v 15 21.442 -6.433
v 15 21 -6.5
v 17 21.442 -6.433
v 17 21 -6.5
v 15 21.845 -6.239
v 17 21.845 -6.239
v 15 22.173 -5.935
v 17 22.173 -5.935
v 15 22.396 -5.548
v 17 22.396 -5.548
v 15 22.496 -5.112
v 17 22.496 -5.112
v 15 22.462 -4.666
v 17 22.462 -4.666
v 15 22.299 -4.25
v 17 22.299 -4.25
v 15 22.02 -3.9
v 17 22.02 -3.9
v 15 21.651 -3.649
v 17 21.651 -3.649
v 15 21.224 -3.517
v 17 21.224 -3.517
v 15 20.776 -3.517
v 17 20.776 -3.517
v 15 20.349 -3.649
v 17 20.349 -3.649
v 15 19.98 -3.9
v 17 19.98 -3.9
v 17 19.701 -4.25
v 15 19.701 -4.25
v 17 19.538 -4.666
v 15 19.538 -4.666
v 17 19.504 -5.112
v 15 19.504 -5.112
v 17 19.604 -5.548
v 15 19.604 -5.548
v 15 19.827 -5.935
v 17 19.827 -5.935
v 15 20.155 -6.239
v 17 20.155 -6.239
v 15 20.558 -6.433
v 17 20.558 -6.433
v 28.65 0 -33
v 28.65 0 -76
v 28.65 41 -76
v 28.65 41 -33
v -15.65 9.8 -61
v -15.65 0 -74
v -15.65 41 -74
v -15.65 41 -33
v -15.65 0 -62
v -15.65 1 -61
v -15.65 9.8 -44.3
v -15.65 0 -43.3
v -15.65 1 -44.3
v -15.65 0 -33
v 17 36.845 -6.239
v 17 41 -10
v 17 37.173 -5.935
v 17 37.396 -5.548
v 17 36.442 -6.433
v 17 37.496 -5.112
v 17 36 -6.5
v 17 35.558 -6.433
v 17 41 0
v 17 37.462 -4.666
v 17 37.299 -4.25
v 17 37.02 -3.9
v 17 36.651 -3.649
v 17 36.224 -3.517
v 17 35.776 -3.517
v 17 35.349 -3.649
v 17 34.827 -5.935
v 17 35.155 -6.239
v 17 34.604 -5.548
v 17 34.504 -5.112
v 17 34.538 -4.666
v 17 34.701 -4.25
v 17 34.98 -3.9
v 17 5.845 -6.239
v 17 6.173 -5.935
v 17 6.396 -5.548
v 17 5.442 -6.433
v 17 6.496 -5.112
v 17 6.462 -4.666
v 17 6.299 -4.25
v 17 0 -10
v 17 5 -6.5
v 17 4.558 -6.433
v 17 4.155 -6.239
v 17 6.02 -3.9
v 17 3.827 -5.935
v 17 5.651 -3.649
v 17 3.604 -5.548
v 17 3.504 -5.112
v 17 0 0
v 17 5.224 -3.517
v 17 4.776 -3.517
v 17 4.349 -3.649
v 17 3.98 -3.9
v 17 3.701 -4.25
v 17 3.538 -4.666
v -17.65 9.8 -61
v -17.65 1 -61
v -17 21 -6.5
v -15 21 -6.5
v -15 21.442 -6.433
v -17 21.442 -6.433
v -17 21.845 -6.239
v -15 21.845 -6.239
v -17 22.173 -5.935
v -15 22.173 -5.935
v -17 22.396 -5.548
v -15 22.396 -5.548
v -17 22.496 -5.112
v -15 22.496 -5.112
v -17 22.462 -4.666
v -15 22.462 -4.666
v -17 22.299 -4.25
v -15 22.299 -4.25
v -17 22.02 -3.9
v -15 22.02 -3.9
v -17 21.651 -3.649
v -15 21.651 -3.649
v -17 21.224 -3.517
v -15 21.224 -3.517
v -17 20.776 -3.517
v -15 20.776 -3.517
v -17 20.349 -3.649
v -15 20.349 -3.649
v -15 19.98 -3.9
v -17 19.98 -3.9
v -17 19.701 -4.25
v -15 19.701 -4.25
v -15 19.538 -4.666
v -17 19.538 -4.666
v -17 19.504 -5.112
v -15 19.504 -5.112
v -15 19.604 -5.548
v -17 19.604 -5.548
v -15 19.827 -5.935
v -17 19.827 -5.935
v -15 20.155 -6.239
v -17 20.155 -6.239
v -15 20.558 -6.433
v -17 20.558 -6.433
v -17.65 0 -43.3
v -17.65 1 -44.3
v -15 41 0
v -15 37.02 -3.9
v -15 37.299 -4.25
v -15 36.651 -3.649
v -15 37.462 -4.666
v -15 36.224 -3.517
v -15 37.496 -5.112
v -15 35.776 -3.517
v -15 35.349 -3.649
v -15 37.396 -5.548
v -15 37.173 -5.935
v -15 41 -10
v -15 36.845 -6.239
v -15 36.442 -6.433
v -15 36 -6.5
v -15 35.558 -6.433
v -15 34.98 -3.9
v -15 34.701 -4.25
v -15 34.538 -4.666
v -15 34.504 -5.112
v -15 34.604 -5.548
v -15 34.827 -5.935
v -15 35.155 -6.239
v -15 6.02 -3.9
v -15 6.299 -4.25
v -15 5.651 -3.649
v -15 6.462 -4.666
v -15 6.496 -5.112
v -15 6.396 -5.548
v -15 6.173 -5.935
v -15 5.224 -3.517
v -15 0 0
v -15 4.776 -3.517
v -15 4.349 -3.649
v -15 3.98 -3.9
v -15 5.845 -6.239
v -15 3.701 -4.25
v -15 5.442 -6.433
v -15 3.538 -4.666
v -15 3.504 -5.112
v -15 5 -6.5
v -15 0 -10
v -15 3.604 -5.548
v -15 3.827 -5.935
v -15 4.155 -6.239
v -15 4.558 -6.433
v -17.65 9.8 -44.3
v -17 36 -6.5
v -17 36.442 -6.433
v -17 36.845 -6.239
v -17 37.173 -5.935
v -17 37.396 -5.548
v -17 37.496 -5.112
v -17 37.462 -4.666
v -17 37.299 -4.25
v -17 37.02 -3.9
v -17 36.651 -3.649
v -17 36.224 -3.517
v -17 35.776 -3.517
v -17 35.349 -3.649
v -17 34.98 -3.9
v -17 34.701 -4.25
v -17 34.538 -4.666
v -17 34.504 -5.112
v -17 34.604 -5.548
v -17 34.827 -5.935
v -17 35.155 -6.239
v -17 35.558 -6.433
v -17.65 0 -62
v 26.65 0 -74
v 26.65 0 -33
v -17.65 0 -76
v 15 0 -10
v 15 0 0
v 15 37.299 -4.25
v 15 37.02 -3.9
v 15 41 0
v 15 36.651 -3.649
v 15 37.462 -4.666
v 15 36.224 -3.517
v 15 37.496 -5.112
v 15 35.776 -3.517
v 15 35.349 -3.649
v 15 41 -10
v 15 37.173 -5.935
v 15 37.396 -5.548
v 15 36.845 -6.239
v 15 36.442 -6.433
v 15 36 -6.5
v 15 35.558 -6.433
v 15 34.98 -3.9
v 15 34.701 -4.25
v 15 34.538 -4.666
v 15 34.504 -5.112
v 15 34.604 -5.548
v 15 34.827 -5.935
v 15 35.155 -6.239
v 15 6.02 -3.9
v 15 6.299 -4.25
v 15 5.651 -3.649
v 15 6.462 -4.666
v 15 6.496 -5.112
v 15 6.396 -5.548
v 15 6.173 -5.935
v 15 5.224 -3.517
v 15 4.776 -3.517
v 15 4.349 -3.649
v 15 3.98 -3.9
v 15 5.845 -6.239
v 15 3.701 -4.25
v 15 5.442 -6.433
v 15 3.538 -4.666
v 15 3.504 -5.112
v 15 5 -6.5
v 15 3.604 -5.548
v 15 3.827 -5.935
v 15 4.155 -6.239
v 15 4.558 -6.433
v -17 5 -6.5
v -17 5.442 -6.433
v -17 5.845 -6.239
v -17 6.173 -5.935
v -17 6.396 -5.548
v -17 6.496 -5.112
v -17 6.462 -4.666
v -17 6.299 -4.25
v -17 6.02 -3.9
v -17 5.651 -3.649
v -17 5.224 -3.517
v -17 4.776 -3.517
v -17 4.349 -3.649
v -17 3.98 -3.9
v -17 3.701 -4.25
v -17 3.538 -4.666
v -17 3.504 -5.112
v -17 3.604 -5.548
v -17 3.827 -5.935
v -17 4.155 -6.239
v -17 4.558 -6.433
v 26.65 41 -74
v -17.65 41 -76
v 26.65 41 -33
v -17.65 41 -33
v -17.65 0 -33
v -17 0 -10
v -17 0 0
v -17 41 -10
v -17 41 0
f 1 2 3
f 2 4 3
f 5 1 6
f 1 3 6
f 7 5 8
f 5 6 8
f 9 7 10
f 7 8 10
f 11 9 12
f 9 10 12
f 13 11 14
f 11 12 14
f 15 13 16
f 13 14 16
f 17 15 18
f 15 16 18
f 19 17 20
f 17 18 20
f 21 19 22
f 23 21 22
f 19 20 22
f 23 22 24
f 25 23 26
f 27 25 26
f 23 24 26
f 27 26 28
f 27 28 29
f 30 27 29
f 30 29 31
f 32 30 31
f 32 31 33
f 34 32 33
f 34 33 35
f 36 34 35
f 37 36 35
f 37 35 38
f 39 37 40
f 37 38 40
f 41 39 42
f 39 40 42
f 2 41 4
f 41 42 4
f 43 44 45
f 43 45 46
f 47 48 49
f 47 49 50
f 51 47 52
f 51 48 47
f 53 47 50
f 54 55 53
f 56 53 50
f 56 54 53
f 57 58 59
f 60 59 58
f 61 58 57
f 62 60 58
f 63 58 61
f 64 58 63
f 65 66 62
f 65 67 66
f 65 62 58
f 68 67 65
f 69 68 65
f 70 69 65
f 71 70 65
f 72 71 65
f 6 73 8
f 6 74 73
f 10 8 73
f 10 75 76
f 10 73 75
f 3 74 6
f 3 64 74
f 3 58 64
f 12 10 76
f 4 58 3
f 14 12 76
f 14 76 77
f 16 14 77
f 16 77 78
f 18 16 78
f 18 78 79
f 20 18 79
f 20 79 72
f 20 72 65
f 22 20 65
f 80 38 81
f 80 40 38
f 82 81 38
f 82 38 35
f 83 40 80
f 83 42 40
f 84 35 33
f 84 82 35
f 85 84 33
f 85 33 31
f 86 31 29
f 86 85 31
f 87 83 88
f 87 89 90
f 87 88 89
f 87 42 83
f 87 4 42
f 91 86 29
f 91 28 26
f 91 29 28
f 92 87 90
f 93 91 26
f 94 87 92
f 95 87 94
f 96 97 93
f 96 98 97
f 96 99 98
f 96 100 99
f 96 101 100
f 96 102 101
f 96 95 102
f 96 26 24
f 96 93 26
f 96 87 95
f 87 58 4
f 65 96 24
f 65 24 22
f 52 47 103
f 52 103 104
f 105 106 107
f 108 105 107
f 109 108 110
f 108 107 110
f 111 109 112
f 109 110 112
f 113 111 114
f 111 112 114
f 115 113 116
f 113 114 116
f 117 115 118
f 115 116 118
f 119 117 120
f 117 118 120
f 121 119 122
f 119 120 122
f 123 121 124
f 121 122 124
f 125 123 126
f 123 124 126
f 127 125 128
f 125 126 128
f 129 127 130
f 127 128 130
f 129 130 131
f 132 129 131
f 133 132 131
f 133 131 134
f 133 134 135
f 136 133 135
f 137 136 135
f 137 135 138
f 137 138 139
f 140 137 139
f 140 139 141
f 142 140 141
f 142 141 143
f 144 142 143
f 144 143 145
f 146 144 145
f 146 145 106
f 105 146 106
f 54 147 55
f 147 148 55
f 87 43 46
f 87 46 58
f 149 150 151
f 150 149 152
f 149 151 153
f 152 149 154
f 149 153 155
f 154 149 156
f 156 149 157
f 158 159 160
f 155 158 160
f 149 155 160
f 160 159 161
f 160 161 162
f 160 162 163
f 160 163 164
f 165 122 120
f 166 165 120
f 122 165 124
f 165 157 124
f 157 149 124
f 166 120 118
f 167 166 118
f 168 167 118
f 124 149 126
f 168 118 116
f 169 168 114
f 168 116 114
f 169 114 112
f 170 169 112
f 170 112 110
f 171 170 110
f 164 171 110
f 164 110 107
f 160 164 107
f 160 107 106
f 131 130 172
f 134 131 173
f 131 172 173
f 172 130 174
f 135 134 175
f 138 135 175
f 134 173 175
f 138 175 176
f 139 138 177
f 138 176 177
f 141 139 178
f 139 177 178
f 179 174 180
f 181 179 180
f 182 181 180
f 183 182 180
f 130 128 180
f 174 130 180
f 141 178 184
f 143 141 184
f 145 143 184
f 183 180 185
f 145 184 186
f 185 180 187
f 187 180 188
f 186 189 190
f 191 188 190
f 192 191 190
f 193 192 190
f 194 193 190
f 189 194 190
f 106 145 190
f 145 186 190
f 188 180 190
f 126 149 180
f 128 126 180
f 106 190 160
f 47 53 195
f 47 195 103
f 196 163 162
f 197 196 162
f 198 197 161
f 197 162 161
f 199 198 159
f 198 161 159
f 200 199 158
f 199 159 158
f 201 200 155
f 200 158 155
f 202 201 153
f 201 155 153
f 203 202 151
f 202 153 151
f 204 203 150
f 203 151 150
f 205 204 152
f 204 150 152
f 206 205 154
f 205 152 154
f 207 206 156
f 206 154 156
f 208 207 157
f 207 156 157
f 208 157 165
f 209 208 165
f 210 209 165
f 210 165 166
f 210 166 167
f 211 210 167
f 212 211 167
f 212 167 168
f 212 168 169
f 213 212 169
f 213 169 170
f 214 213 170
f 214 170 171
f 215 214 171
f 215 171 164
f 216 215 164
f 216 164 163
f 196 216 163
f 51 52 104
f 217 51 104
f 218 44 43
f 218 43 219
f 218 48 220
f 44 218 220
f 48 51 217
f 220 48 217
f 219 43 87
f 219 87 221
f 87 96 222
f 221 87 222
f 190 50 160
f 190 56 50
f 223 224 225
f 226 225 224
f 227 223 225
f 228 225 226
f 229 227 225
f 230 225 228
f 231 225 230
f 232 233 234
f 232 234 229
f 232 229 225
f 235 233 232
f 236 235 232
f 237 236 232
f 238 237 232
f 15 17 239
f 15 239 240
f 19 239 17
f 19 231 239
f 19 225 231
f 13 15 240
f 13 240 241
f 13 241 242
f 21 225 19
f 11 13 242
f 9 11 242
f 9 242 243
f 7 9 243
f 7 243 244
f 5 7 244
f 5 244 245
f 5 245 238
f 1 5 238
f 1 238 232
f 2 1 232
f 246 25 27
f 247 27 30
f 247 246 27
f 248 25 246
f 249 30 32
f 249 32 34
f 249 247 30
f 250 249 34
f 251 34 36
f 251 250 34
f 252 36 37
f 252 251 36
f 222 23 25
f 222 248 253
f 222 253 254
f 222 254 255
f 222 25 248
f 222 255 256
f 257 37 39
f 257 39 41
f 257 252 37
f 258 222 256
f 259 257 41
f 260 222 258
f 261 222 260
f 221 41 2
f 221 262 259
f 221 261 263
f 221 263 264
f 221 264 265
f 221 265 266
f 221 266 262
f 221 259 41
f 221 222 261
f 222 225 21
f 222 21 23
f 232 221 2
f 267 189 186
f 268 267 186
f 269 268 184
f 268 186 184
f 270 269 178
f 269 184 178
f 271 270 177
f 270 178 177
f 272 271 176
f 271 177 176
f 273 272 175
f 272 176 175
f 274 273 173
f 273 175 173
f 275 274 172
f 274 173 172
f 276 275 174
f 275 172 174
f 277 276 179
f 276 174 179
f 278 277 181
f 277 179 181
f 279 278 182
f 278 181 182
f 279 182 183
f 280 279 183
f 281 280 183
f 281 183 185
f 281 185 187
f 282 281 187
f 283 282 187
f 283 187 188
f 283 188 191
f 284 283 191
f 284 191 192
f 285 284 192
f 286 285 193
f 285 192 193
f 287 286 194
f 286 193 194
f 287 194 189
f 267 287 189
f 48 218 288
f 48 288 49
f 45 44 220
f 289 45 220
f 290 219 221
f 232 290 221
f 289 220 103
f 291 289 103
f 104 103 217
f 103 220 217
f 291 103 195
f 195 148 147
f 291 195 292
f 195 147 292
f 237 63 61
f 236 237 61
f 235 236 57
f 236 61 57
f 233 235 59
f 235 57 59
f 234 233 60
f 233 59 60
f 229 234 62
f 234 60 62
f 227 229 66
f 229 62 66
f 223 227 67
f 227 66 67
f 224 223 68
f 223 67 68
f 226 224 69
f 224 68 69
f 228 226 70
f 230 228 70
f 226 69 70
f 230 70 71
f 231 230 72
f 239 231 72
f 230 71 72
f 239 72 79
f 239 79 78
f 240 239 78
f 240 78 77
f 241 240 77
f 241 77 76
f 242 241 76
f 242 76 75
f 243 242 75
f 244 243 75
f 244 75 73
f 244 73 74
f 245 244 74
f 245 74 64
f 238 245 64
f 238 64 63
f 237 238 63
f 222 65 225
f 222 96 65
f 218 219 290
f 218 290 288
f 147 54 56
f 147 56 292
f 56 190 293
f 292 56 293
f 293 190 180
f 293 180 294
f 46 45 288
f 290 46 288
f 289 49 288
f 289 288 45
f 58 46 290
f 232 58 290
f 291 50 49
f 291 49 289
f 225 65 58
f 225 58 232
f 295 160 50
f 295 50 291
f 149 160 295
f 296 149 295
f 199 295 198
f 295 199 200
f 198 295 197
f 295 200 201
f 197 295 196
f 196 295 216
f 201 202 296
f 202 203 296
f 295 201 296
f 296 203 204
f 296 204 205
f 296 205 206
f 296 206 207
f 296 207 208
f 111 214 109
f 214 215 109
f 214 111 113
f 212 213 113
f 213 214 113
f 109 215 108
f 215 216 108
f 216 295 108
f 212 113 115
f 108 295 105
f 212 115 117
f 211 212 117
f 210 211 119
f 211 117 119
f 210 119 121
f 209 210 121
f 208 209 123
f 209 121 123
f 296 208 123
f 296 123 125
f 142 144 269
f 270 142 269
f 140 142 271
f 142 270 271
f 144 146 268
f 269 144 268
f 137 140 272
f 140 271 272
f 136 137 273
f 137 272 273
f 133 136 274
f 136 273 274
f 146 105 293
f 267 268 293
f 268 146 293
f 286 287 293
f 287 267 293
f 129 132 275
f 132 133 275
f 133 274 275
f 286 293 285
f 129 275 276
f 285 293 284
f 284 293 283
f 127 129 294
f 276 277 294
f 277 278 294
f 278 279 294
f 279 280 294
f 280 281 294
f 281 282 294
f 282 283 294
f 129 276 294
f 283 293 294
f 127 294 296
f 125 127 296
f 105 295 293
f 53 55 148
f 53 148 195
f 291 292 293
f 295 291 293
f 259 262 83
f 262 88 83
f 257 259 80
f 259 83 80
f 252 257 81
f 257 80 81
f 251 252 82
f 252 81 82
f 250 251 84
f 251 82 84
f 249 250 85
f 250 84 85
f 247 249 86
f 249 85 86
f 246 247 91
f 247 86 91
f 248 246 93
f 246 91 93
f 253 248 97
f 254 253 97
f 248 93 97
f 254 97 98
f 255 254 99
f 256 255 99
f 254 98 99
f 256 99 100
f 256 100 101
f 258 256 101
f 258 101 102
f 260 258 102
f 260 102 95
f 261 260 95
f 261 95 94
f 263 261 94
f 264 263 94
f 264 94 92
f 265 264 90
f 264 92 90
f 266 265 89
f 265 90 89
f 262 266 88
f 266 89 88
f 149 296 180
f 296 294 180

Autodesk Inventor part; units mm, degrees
ref_plane "YZ Plane" through (0, 0, 0) normal (1, 0, 0) x (0, 1, 0)
ref_plane "XZ Plane" through (0, 0, 0) normal (0, 1, 0) x (-1, 0, 0)
ref_plane "XY Plane" through (0, 0, 0) normal (0, 0, 1) x (1, 0, 0)
sketch "Sketch3" plane through (0, 0, 0) normal (0, 1, 0) x (-1, 0, 0)
  line L0 (0, 0) -> (15, 0) construction
  line L1 (0, 0) -> (-15, 0) construction
  line L2 (15, 0) -> (15, -10)
  line L3 (15, -10) -> (17, -10)
  line L4 (17, -10) -> (17, 0)
  line L5 (17, 0) -> (15, 0)
  line L6 (-15, 0) -> (-15, -10)
  line L7 (-15, -10) -> (-17, -10)
  line L8 (-17, -10) -> (-17, 0)
  line L9 (-17, 0) -> (-15, 0)
  line L10 (0, 0) -> (0, -74) construction
  line L11 (0, -74) -> (15.65, -74)
  line L12 (0, -74) -> (-26.65, -74)
  line L13 (15.65, -74) -> (15.65, -76)
  line L14 (15.65, -76) -> (-26.65, -76)
  line L15 (-26.65, -76) -> (-26.65, -74)
  line L16 (15.65, -76) -> (17.65, -76)
  line L17 (17.65, -76) -> (17.65, -33)
  line L18 (17.65, -33) -> (17, -10)
  line L19 (-26.65, -76) -> (-28.65, -76)
  line L20 (-28.65, -76) -> (-28.65, -33)
  line L21 (-28.65, -33) -> (-17, -10)
  line L22 (-26.65, -33) -> (-26.65, -74)
  line L23 (-26.65, -33) -> (-15, -10)
  line L24 (15.65, -74) -> (15.65, -33)
  line L25 (15.65, -33) -> (15, -10)
  dimension "d19" = 15
  dimension "d20" = 15
  dimension "d21" = 10
  dimension "d22" = 2
  dimension "d23" = 2
  dimension "d24" = 74
  dimension "d25" = 15.65
  dimension "d26" = 26.65
  dimension "d27" = 2
  dimension "d28" = 2
  dimension "d29" = 43
  dimension "d30" = 2
extrude "Extrusion3" add sketch "Sketch3" along normal blind 41
sketch "Sketch4" plane through (17, 0, 0) normal (1, 0, 0) x (0, 0, -1)
  line L0 (0, 41) -> (10, 41) projected
  line L1 (5, 41) -> (5, 0) construction
  line L2 (0, 0) -> (10, 0) projected
  circle A0 centre (5, 36) radius 1.5
  circle A1 centre (5, 21) radius 1.5
  circle A2 centre (5, 5) radius 1.5
  dimension "d33" = 3
  dimension "d34" = 3
  dimension "d35" = 3
  dimension "d36" = 5
  dimension "d37" = 20
  dimension "d38" = 5
extrude "Extrusion4" cut sketch "Sketch4" against normal blind 41
sketch "Sketch5" plane through (-15.65, 0, -33) normal (1, 0, 0) x (0, 0, -1)
  line L0 (43, 41) -> (0, 41) construction
  line L1 (43, 41) -> (28, 41) construction
  line L2 (28, 41) -> (11.3, 41)
  line L3 (0, 41) -> (41, 41) projected
  line L4 (11.3, 41) -> (11.3, 31.2)
  line L5 (11.3, 31.2) -> (28, 31.2)
  line L6 (28, 31.2) -> (28, 41)
  line L7 (-33, 0) -> (-33, 41) projected
  line L8 (-33, 20.5) -> (43.2926, 20.5)
  line L9 (43, 0) -> (0, 0) construction
  line L10 (28, 0) -> (11.3, 0)
  line L11 (11.3, 0) -> (11.3, 9.8)
  line L12 (11.3, 9.8) -> (28, 9.8)
  line L13 (28, 9.8) -> (28, 0)
  dimension "d41" = 15
  dimension "d42" = 16.7
  dimension "d43" = 9.8
extrude "Extrusion5" cut sketch "Sketch5" against normal blind 41 contours L10 L11 L12 L13
chamfer "Chamfer1" distance 1 angle 45 2 edges at (-16.65, 0, -61) (-16.65, 0, -44.3)
properties part number "nema 17 holder" material "Acetal Resin, Black"
